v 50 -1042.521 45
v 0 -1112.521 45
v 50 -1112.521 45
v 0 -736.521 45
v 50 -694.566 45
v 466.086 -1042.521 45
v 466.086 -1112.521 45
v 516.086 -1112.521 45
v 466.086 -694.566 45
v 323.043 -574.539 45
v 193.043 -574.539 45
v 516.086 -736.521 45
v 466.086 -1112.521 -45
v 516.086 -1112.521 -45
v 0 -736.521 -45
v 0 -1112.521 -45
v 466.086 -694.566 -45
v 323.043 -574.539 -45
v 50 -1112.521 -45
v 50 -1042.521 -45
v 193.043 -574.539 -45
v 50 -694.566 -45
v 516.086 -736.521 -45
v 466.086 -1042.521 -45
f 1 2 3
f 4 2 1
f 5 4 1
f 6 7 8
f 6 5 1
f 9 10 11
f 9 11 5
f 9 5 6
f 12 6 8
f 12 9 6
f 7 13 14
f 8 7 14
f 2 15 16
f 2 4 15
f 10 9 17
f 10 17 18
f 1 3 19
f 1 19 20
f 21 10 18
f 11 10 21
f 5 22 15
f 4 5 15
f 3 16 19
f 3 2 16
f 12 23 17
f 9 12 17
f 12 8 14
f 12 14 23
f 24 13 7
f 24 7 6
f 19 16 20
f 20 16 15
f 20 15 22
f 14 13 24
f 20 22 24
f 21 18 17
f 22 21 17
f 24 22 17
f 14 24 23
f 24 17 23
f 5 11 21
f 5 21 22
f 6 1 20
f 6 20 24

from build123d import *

# Parameters (mm, degrees)
SKETCH_3_W      = 143.043199666
SKETCH_3_H      = 233.991238821
SKETCH_3_W_2    = 65
SKETCH_3_W_3    = 50
SKETCH_3_H_2    = 70
SKETCH_3_H_3    = 233.99123882
EXTRUDE_1_DEPTH = 45


with BuildPart() as part:
    # 草图3 → 凸台-拉伸1 (new, symmetric)
    with BuildSketch(Plane.XY):
        with Locations((394.564799499, -925.525377252)):
            Rectangle(SKETCH_3_W, SKETCH_3_H)
        with Locations((290.543199666, -925.525377252)):
            Rectangle(SKETCH_3_W_2, SKETCH_3_H)
        with Locations((225.543199666, -925.525377252)):
            Rectangle(SKETCH_3_W_2, SKETCH_3_H)
        with Locations((121.521599833, -925.525377252)):
            Rectangle(SKETCH_3_W, SKETCH_3_H)
        with Locations((25, -925.525377252)):
            Rectangle(SKETCH_3_W_3, SKETCH_3_H)
        with Locations((25, -1077.520996662)):
            Rectangle(SKETCH_3_W_3, SKETCH_3_H_2)
        with Locations((491.086399332, -1077.520996662)):
            Rectangle(SKETCH_3_W_3, SKETCH_3_H_2)
        with Locations((491.086399332, -925.525377252)):
            Rectangle(SKETCH_3_W_3, SKETCH_3_H)
        Polygon((466.086399332, -694.566015103), (466.086399332, -808.529757841), (516.086399332, -808.529757841), (516.086399332, -736.520996662), align=None)
        Polygon((323.043199666, -574.538519021), (323.043199666, -808.529757841), (466.086399332, -808.529757841), (466.086399332, -694.566015103), align=None)
        with Locations((290.543199666, -691.534138431)):
            Rectangle(SKETCH_3_W_2, SKETCH_3_H_3)
        with Locations((225.543199666, -691.534138431)):
            Rectangle(SKETCH_3_W_2, SKETCH_3_H_3)
        Polygon((50, -694.566015103), (50, -808.529757841), (193.043199666, -808.529757841), (193.043199666, -574.538519021), align=None)
        Polygon((0, -736.520996662), (0, -808.529757841), (50, -808.529757841), (50, -694.566015103), align=None)
    extrude(amount=EXTRUDE_1_DEPTH, both=True)


solid = part.part
